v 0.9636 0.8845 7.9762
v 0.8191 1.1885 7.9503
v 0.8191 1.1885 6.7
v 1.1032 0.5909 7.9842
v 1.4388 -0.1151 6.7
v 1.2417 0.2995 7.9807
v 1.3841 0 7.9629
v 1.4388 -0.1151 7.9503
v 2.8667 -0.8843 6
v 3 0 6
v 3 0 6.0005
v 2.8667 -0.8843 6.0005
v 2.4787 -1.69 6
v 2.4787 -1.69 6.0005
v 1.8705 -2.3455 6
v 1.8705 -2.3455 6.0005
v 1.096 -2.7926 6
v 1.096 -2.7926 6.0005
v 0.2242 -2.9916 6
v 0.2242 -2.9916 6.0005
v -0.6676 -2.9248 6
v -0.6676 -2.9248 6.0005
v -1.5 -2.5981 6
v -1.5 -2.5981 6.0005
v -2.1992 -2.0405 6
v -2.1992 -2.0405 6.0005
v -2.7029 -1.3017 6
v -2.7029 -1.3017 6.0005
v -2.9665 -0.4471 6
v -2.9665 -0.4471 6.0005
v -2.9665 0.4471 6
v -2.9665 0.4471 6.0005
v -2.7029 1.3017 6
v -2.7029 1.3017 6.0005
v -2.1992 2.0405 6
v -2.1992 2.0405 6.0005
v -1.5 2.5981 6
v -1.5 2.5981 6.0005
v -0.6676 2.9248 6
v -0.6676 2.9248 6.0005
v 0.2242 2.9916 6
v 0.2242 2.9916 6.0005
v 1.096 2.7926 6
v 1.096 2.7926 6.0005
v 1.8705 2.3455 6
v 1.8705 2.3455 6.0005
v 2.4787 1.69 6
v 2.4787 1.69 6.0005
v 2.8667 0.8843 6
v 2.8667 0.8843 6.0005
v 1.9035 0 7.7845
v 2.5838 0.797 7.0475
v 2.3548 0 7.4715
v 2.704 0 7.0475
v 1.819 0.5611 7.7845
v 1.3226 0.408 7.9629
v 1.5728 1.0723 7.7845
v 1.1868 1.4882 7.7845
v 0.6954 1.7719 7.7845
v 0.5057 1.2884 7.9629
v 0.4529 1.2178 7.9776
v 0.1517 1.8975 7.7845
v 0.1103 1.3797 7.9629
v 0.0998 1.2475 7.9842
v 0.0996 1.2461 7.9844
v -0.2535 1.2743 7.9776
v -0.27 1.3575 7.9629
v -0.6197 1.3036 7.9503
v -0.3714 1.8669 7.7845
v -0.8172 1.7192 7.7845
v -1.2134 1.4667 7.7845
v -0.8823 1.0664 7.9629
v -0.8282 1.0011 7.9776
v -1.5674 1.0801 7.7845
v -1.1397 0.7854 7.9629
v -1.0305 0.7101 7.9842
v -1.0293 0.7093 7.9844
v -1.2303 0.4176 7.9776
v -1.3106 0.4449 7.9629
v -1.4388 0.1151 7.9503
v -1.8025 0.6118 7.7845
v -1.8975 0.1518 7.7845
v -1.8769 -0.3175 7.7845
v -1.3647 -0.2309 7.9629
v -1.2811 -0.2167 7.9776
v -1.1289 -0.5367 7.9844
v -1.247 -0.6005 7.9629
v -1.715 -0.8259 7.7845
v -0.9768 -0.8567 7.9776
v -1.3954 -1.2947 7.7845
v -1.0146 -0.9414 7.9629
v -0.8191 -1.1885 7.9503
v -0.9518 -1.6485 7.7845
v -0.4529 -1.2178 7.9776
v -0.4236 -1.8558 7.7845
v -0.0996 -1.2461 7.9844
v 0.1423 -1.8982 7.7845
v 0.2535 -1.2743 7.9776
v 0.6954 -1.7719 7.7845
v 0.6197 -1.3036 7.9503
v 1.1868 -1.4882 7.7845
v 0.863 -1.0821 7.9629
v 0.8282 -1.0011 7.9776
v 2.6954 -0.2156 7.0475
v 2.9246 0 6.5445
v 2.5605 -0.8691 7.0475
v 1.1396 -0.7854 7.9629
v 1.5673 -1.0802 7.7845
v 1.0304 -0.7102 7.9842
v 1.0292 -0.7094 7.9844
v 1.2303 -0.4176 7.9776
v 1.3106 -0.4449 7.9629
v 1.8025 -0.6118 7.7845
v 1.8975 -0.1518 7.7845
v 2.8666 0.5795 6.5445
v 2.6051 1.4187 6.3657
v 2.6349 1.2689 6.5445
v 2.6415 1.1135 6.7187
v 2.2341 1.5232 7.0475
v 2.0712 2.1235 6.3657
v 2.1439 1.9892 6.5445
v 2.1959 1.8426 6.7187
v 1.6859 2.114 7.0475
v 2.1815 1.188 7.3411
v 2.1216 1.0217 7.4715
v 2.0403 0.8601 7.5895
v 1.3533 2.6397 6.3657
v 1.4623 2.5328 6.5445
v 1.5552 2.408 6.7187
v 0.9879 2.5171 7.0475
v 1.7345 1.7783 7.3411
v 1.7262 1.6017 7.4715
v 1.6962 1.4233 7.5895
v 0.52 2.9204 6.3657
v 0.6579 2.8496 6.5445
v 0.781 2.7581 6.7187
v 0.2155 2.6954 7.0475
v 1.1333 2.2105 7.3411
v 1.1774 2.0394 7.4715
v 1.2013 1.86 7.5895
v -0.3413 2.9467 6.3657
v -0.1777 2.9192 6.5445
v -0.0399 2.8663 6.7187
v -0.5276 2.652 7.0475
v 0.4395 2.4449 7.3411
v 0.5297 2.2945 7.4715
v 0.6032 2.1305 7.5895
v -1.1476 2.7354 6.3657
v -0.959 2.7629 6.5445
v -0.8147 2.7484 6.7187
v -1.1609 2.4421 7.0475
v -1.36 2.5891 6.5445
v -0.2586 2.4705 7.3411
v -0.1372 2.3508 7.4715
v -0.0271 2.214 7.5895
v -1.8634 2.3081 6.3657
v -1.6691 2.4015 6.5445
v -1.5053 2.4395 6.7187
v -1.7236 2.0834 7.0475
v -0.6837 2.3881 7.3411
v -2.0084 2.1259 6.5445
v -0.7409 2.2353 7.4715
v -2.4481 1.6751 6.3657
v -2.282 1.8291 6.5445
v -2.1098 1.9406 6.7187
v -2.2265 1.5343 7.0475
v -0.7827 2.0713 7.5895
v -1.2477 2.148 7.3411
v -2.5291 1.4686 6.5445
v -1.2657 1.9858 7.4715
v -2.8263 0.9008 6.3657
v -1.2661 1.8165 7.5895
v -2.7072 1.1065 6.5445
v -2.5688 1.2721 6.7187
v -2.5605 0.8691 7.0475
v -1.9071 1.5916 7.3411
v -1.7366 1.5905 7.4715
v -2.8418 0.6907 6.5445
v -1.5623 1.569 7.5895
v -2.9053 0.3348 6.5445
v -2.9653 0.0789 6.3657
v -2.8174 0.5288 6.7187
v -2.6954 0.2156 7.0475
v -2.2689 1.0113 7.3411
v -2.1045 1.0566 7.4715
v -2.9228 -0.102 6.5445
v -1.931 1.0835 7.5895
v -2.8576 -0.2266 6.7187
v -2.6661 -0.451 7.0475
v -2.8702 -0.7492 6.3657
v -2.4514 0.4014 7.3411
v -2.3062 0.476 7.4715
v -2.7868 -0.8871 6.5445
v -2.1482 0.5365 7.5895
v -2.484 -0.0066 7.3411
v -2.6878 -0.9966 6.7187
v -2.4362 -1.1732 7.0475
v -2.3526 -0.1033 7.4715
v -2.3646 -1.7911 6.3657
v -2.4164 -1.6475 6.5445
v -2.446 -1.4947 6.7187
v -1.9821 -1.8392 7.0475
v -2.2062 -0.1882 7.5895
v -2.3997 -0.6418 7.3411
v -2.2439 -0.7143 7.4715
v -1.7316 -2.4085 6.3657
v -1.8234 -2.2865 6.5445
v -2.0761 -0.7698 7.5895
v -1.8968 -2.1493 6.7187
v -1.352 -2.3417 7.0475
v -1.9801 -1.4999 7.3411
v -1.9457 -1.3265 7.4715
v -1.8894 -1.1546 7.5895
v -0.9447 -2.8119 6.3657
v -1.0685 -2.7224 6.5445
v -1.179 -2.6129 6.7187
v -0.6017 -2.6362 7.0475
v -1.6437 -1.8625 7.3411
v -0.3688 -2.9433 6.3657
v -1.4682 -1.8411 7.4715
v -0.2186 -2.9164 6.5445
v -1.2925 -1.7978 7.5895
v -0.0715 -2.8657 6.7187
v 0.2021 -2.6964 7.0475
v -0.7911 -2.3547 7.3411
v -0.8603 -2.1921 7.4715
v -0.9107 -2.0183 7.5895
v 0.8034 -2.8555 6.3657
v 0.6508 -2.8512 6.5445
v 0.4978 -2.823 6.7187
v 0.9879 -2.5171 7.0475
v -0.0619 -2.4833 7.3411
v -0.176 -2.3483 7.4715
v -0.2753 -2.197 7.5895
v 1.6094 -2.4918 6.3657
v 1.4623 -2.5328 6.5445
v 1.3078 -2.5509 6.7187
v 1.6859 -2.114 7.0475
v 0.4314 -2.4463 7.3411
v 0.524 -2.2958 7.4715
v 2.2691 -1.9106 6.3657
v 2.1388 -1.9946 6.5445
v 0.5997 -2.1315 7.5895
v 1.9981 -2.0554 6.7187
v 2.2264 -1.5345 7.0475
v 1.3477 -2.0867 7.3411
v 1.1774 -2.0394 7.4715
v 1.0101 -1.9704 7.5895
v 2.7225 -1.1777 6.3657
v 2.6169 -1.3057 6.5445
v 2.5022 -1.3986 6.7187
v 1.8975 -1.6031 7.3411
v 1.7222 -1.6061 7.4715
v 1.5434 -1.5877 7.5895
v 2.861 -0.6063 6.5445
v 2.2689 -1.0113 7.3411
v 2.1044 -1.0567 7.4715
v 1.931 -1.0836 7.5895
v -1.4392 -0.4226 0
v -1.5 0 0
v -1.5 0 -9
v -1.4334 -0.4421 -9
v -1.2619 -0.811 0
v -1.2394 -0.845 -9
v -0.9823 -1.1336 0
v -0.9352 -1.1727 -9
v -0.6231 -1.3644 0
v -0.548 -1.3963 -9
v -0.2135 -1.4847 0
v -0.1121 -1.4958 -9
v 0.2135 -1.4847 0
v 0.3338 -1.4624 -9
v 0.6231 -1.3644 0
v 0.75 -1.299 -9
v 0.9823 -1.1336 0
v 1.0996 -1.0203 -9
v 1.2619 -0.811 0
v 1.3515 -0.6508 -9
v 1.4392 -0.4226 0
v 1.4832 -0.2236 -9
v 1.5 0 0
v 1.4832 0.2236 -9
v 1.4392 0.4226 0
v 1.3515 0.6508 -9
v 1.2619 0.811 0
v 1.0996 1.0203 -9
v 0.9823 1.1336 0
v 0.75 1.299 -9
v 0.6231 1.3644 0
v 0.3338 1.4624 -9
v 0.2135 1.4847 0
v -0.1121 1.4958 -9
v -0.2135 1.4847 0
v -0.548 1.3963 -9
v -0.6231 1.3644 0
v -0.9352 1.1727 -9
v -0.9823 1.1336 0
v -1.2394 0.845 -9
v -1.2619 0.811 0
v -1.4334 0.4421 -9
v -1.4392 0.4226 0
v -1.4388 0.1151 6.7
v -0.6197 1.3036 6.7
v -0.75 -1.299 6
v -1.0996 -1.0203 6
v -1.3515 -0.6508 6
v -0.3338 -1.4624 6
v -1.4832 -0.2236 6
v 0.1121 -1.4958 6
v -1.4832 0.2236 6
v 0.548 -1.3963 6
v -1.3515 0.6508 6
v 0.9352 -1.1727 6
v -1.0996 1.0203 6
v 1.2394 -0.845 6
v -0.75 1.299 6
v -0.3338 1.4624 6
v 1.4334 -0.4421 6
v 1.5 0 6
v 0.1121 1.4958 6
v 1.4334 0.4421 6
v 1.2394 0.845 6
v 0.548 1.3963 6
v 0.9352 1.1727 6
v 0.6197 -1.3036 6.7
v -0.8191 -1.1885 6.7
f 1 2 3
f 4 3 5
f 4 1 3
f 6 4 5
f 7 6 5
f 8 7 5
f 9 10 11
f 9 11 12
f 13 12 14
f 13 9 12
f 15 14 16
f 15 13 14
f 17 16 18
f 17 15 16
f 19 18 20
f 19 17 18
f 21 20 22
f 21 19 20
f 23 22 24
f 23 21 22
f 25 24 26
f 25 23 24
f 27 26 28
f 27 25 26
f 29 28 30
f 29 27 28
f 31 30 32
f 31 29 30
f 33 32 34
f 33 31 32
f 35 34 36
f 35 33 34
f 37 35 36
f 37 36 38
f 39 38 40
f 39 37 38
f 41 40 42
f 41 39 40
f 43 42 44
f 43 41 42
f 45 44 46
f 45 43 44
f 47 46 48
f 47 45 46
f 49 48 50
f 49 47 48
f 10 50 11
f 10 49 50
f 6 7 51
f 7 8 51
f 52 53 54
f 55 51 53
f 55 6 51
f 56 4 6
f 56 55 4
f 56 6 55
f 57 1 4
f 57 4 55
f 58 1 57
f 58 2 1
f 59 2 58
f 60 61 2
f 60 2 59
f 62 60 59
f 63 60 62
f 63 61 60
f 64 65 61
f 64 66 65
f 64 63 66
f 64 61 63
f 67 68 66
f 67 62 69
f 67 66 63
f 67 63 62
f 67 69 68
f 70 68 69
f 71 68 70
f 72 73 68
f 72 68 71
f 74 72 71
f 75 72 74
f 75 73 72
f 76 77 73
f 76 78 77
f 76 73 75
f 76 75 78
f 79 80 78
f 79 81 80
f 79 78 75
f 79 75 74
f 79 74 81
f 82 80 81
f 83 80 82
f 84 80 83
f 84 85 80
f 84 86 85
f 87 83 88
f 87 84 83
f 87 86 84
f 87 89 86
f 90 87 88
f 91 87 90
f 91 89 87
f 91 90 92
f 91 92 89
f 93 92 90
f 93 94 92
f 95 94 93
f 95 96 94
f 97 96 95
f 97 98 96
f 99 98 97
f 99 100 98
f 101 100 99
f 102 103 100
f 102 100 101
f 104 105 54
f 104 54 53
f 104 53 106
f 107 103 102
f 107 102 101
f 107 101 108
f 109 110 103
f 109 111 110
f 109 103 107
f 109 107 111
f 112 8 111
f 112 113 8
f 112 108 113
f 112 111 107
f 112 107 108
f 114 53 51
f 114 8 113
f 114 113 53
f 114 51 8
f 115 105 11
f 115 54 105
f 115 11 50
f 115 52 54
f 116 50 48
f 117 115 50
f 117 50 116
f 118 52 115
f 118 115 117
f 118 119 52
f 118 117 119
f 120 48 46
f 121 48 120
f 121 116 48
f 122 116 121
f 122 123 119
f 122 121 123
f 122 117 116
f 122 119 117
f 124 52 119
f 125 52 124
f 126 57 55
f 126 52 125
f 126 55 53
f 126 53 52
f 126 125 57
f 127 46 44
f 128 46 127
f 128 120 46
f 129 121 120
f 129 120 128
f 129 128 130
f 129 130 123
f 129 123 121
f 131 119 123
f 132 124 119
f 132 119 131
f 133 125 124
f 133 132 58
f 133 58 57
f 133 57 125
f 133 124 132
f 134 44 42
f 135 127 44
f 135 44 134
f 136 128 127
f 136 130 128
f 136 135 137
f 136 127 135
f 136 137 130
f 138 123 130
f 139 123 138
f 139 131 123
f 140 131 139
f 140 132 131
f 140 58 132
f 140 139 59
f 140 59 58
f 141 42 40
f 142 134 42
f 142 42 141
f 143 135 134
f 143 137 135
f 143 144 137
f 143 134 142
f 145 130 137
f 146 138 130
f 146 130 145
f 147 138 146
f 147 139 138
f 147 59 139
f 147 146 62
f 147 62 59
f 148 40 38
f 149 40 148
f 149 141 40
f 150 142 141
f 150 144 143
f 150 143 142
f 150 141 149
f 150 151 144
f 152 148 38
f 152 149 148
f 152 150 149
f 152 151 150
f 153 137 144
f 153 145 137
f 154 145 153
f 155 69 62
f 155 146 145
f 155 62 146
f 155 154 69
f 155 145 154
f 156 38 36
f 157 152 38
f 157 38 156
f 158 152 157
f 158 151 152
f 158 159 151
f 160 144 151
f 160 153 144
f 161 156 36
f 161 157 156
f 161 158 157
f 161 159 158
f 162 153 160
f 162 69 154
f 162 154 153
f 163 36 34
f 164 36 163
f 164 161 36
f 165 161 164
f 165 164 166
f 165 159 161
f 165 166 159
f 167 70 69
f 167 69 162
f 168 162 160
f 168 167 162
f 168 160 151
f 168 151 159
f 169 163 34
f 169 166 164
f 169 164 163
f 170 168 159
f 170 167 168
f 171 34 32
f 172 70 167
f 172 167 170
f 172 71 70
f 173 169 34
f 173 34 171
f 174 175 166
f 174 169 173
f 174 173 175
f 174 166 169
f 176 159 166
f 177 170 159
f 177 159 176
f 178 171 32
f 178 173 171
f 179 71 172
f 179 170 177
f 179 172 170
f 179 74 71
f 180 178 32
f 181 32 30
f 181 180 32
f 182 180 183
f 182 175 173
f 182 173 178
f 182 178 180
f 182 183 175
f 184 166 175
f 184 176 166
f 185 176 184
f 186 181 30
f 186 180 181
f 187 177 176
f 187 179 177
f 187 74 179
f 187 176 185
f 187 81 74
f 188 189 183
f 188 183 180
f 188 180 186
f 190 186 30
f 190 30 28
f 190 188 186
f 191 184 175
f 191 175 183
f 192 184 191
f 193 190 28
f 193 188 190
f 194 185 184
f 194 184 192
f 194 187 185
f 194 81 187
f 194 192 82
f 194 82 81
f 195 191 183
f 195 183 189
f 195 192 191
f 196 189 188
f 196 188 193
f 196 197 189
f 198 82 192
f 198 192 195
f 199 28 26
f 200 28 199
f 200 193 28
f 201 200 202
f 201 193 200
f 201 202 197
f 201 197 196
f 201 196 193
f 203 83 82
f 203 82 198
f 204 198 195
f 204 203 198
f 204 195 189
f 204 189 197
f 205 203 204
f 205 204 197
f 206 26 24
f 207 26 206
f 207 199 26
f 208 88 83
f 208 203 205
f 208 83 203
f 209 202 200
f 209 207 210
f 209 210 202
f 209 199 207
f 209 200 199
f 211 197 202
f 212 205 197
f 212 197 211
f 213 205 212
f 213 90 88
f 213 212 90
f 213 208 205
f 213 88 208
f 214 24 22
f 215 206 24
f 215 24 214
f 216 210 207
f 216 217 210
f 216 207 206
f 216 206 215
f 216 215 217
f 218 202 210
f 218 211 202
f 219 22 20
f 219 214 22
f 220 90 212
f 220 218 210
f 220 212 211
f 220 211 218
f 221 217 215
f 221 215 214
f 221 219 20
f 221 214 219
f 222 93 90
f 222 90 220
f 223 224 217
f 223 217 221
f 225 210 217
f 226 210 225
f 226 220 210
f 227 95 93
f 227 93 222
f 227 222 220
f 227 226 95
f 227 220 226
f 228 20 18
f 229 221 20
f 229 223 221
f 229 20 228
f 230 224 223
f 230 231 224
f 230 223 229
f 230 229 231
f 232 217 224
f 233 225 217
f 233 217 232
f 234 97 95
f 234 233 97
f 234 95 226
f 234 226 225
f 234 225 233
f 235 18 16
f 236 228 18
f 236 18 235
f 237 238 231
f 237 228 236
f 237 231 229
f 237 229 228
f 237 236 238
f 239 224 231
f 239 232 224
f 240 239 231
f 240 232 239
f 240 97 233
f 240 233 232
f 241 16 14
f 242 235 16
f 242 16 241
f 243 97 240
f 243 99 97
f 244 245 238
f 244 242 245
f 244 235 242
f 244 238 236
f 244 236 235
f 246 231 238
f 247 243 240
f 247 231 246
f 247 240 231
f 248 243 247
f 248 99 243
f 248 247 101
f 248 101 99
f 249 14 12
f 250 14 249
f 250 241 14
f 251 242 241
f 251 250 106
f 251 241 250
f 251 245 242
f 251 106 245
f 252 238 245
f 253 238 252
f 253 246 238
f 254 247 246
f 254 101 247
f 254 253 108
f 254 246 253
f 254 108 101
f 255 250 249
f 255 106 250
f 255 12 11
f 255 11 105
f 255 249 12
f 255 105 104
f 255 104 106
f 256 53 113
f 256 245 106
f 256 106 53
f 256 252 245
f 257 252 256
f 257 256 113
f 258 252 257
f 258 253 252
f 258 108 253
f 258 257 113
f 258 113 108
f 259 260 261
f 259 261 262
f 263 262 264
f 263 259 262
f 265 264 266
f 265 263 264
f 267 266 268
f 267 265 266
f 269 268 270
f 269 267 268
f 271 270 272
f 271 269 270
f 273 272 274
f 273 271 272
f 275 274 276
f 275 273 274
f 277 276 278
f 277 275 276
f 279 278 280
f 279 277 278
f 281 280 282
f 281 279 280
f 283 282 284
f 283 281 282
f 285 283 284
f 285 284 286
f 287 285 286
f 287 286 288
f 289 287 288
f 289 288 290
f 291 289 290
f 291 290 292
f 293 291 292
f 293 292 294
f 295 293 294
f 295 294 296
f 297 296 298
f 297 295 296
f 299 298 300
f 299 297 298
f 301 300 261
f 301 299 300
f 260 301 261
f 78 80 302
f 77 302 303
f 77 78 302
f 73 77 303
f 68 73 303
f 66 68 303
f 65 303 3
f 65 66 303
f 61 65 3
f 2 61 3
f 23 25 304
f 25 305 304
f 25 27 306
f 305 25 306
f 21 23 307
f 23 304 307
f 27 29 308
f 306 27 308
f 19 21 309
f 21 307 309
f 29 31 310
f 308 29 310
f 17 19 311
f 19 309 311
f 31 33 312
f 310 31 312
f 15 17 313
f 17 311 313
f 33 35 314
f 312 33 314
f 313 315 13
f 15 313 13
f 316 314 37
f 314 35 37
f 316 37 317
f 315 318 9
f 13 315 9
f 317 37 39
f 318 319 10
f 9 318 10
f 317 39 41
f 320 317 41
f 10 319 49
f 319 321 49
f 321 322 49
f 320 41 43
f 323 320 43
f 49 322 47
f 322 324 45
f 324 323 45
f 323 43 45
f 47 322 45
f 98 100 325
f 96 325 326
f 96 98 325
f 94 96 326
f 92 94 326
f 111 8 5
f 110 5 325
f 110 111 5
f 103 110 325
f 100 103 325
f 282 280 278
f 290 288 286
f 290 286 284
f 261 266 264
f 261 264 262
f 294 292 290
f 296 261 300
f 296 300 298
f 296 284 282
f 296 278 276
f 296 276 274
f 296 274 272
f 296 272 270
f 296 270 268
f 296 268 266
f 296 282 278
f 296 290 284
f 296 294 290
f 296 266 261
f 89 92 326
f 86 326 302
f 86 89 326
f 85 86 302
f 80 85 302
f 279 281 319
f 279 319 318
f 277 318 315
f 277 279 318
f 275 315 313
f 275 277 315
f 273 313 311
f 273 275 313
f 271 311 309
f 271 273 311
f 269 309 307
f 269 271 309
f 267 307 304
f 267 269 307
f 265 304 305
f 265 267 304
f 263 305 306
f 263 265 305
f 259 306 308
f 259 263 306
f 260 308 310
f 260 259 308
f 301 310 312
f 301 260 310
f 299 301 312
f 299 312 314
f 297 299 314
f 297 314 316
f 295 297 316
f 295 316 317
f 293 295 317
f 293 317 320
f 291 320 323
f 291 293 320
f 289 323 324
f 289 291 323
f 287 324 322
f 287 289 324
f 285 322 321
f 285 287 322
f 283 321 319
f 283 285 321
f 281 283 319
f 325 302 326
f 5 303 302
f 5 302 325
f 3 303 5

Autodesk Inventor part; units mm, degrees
ref_plane "YZ Plane" through (0, 0, 0) normal (1, 0, 0) x (0, 1, 0)
ref_plane "XZ Plane" through (0, 0, 0) normal (0, 1, 0) x (-1, 0, 0)
ref_plane "XY Plane" through (0, 0, 0) normal (0, 0, 1) x (1, 0, 0)
sketch "スケッチ1" plane through (0, 0, 0) normal (0, 0, 1) x (1, 0, 0)
  circle A0 centre (0, 0) radius 1.5
  dimension "d0" = 3
extrude "押し出し1" add sketch "スケッチ1" along normal blind 6
sketch "スケッチ2" plane through (0, 0, 6) normal (0, 0, 1) x (1, 0, 0)
  circle A0 centre (0, 0) radius 1.5 projected
  circle A1 centre (0, 0) radius 3
  dimension "d3" = 6
extrude "押し出し2" add sketch "スケッチ2" along normal blind 2 contours A0 | A1
fillet "フィレット1" radius 2 1 edges at (-3, 0, 8)
thread "ねじ1" size "M3x0.5" class "6g" standard "ANSI Metric M Profile" full length
sketch "スケッチ3" plane through (0, 0, 0) normal (0, 0, -1) x (-1, 0, 0)
  circle A0 centre (0, 0) radius 1.5 projected
extrude "押し出し3" add sketch "スケッチ3" along normal blind 9
sketch "スケッチ4" plane through (0, 0, 8) normal (0, 0, 1) x (1, 0, 0)
  line L0 (0.8191, 1.1885) -> (1.4388, -0.1151)
  line L1 (1.4388, -0.1151) -> (0.6197, -1.3036)
  line L2 (0.6197, -1.3036) -> (-0.8191, -1.1885)
  line L3 (-0.8191, -1.1885) -> (-1.4388, 0.1151)
  line L4 (-1.4388, 0.1151) -> (-0.6197, 1.3036)
  line L5 (-0.6197, 1.3036) -> (0.8191, 1.1885)
  point P0 (0, 0)
  point P1 (0, 0)
  dimension "d11" = 2.5
extrude "押し出し4" cut sketch "スケッチ4" against normal blind 1.3
properties part number "SB　15mmなべネジ" material "Steel, Mild"
